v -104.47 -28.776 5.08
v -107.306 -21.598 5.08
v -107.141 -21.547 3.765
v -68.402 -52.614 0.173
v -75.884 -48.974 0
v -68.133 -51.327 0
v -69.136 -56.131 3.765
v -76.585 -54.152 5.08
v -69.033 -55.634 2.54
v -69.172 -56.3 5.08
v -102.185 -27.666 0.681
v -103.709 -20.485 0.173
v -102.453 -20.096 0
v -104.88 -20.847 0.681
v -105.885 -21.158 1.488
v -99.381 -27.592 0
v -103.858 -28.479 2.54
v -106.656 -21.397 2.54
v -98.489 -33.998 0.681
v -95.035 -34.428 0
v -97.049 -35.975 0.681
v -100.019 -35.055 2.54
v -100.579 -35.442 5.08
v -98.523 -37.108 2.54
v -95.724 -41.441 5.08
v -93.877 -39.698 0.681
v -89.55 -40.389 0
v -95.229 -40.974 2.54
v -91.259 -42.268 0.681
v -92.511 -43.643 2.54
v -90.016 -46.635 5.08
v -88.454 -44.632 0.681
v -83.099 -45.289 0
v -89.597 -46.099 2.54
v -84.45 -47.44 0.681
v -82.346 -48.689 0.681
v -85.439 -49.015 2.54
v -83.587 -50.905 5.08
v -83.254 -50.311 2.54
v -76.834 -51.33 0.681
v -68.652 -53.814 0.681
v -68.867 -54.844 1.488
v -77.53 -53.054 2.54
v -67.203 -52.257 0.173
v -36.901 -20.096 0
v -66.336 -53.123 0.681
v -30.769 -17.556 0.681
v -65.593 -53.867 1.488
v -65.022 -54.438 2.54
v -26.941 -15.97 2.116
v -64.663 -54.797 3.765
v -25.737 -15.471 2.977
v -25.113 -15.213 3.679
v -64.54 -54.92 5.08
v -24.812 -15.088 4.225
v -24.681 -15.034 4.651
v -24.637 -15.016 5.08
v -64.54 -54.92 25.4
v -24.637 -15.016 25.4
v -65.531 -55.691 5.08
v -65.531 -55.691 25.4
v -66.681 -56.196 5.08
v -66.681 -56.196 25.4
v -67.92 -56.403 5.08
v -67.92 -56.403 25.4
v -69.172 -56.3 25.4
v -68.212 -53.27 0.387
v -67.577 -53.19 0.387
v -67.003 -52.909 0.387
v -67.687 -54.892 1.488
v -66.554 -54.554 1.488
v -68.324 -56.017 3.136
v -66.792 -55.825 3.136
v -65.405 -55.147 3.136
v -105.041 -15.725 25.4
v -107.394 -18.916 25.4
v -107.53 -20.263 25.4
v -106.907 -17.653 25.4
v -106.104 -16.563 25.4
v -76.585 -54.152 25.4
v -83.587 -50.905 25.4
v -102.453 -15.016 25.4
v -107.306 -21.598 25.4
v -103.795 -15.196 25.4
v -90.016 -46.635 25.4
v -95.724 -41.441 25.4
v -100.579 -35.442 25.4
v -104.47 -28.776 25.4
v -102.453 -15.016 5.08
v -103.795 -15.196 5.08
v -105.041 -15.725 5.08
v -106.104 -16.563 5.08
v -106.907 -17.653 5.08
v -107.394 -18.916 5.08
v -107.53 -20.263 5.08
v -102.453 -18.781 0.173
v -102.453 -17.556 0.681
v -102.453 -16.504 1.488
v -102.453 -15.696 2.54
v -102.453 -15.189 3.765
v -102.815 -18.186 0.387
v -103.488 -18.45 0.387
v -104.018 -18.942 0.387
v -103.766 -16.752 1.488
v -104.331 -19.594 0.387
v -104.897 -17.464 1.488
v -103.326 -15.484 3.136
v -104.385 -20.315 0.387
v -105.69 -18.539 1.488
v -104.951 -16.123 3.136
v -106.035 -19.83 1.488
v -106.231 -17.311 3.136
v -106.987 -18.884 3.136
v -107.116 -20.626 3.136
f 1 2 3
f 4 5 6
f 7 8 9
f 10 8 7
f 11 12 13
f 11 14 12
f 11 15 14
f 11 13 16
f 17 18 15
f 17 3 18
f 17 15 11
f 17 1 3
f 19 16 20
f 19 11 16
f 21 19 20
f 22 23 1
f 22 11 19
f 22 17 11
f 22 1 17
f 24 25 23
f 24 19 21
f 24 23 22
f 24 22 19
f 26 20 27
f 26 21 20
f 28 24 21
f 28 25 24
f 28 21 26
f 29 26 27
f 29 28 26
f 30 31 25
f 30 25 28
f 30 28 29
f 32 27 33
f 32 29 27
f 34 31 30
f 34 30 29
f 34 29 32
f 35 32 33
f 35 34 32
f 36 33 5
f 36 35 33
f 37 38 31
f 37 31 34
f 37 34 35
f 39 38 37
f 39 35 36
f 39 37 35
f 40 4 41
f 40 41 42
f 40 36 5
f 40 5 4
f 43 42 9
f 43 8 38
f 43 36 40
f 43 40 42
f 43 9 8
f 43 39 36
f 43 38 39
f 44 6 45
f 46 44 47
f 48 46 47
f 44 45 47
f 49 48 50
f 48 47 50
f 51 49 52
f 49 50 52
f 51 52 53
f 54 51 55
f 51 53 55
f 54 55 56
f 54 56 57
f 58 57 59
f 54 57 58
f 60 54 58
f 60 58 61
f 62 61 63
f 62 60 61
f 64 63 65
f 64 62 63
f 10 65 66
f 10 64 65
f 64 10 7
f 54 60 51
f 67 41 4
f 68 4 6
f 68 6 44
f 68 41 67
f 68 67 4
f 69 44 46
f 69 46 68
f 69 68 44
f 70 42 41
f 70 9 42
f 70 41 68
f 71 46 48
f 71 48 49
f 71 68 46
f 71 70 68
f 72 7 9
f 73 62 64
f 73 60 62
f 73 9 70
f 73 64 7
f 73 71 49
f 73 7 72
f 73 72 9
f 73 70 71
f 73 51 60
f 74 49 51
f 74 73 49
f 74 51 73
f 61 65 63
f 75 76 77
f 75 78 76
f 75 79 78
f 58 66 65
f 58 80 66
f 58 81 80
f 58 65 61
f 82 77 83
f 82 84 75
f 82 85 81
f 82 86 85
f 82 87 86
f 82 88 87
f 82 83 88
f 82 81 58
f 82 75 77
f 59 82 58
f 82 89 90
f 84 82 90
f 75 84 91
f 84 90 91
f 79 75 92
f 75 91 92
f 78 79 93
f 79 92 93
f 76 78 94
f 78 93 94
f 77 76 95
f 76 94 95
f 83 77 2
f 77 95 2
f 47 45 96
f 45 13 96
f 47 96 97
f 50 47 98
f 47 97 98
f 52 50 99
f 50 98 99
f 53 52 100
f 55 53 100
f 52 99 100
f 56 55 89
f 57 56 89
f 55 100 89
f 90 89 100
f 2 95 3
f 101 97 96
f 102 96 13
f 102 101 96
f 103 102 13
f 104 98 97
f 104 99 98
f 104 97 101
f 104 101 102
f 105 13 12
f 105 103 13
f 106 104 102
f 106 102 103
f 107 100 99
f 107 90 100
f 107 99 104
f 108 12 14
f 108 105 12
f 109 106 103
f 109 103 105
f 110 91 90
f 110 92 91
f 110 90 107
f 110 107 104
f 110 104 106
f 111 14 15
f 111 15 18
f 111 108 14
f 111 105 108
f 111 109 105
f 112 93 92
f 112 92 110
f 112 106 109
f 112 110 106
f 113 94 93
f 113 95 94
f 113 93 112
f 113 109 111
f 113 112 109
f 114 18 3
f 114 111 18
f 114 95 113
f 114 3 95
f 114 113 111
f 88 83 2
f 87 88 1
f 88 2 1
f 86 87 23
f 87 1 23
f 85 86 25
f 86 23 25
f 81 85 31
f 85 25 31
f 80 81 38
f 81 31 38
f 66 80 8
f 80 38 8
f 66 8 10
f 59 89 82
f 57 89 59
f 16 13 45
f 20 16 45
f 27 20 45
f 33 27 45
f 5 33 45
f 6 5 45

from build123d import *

# Parameters (mm, degrees)
F0_W        = 118.0765684694
F0_H        = 42.3587011173
F1_DEPTH    = 25.4
F2_T1_DEPTH = 275.8687841416
F3_T1_DEPTH = 417.324487366
F4_R        = 5.08
F5_T1_DEPTH = 59.2305880834
F6_R        = 5.08


# Not quite as in the source:
# - a fillet or chamfer that OpenCascade refuses, or shapes differently, is made with other operations: its cross-section is extruded or revolved along the edge and cut away or added


with BuildPart() as f1:
    # F0 (on Top) → F1 (new body)
    with BuildSketch(Plane.XY):
        with Locations((-49.8337792233, -36.1952199601)):
            Rectangle(F0_W, F0_H)
    extrude(amount=F1_DEPTH)

    # F2: fillet of radius 50.8 on 1 edges, made by hand

    # F2_s2 → F2_t1 (cut)
    with BuildSketch(Plane.XY.offset(-125.2343920708)):
        with BuildLine():
            ThreePointArc((-108.872063458, -15.0158694014), (-91.5793890566, -45.3654069575), (-58.7783066297, -57.3745705187))
            Line((-58.7783066297, -57.3745705187), (-108.872063458, -57.3745705187))
            Line((-108.872063458, -57.3745705187), (-108.872063458, -15.0158694014))
        make_face()
    extrude(amount=F2_T1_DEPTH, mode=Mode.SUBTRACT)

    # F3: chamfer of 76.2 on 1 edges, made by hand

    # F3_s2 → F3_t1 (cut)
    with BuildSketch(Plane.XY.offset(-195.962243683)):
        Polygon((9.2045050114, 18.8254294813), (-66.9954949886, -57.3745705187), (9.2045050114, -57.3745705187), align=None)
    extrude(amount=F3_T1_DEPTH, mode=Mode.SUBTRACT)

    # F4
    f4_edges = [f1.edges().sort_by_distance(p)[0] for p in [
        (-66.417785, -56.79686, 12.7),
    ]]
    fillet(f4_edges, radius=F4_R)

    # F5: fillet of radius 5.08 on 1 edges, made by hand

    # F5_s2 → F5_t1 (cut)
    with BuildSketch(Plane.XY.offset(-16.9152940417)):
        with BuildLine():
            ThreePointArc((-102.4531606824, -15.0158694014), (-106.5420738654, -17.081372929), (-107.3059222438, -21.5982359439))
            ThreePointArc((-107.3059222438, -21.5982359439), (-108.1987038654, -18.3331561934), (-108.872063458, -15.0158694014))
            Line((-108.872063458, -15.0158694014), (-102.4531606824, -15.0158694014))
        make_face()
    extrude(amount=F5_T1_DEPTH, mode=Mode.SUBTRACT)

    # F6
    f6_edges = [f1.edges().sort_by_distance(p)[0] for p in [
        (-44.588616, -34.967691, 0),
        (-66.681498, -56.195765, 0),
        (-92.968648, -44.146642, 0),
        (-106.542074, -17.081373, 0),
        (-63.544977, -15.015869, 0),
    ]]
    fillet(f6_edges, radius=F6_R)


solid = f1.part
